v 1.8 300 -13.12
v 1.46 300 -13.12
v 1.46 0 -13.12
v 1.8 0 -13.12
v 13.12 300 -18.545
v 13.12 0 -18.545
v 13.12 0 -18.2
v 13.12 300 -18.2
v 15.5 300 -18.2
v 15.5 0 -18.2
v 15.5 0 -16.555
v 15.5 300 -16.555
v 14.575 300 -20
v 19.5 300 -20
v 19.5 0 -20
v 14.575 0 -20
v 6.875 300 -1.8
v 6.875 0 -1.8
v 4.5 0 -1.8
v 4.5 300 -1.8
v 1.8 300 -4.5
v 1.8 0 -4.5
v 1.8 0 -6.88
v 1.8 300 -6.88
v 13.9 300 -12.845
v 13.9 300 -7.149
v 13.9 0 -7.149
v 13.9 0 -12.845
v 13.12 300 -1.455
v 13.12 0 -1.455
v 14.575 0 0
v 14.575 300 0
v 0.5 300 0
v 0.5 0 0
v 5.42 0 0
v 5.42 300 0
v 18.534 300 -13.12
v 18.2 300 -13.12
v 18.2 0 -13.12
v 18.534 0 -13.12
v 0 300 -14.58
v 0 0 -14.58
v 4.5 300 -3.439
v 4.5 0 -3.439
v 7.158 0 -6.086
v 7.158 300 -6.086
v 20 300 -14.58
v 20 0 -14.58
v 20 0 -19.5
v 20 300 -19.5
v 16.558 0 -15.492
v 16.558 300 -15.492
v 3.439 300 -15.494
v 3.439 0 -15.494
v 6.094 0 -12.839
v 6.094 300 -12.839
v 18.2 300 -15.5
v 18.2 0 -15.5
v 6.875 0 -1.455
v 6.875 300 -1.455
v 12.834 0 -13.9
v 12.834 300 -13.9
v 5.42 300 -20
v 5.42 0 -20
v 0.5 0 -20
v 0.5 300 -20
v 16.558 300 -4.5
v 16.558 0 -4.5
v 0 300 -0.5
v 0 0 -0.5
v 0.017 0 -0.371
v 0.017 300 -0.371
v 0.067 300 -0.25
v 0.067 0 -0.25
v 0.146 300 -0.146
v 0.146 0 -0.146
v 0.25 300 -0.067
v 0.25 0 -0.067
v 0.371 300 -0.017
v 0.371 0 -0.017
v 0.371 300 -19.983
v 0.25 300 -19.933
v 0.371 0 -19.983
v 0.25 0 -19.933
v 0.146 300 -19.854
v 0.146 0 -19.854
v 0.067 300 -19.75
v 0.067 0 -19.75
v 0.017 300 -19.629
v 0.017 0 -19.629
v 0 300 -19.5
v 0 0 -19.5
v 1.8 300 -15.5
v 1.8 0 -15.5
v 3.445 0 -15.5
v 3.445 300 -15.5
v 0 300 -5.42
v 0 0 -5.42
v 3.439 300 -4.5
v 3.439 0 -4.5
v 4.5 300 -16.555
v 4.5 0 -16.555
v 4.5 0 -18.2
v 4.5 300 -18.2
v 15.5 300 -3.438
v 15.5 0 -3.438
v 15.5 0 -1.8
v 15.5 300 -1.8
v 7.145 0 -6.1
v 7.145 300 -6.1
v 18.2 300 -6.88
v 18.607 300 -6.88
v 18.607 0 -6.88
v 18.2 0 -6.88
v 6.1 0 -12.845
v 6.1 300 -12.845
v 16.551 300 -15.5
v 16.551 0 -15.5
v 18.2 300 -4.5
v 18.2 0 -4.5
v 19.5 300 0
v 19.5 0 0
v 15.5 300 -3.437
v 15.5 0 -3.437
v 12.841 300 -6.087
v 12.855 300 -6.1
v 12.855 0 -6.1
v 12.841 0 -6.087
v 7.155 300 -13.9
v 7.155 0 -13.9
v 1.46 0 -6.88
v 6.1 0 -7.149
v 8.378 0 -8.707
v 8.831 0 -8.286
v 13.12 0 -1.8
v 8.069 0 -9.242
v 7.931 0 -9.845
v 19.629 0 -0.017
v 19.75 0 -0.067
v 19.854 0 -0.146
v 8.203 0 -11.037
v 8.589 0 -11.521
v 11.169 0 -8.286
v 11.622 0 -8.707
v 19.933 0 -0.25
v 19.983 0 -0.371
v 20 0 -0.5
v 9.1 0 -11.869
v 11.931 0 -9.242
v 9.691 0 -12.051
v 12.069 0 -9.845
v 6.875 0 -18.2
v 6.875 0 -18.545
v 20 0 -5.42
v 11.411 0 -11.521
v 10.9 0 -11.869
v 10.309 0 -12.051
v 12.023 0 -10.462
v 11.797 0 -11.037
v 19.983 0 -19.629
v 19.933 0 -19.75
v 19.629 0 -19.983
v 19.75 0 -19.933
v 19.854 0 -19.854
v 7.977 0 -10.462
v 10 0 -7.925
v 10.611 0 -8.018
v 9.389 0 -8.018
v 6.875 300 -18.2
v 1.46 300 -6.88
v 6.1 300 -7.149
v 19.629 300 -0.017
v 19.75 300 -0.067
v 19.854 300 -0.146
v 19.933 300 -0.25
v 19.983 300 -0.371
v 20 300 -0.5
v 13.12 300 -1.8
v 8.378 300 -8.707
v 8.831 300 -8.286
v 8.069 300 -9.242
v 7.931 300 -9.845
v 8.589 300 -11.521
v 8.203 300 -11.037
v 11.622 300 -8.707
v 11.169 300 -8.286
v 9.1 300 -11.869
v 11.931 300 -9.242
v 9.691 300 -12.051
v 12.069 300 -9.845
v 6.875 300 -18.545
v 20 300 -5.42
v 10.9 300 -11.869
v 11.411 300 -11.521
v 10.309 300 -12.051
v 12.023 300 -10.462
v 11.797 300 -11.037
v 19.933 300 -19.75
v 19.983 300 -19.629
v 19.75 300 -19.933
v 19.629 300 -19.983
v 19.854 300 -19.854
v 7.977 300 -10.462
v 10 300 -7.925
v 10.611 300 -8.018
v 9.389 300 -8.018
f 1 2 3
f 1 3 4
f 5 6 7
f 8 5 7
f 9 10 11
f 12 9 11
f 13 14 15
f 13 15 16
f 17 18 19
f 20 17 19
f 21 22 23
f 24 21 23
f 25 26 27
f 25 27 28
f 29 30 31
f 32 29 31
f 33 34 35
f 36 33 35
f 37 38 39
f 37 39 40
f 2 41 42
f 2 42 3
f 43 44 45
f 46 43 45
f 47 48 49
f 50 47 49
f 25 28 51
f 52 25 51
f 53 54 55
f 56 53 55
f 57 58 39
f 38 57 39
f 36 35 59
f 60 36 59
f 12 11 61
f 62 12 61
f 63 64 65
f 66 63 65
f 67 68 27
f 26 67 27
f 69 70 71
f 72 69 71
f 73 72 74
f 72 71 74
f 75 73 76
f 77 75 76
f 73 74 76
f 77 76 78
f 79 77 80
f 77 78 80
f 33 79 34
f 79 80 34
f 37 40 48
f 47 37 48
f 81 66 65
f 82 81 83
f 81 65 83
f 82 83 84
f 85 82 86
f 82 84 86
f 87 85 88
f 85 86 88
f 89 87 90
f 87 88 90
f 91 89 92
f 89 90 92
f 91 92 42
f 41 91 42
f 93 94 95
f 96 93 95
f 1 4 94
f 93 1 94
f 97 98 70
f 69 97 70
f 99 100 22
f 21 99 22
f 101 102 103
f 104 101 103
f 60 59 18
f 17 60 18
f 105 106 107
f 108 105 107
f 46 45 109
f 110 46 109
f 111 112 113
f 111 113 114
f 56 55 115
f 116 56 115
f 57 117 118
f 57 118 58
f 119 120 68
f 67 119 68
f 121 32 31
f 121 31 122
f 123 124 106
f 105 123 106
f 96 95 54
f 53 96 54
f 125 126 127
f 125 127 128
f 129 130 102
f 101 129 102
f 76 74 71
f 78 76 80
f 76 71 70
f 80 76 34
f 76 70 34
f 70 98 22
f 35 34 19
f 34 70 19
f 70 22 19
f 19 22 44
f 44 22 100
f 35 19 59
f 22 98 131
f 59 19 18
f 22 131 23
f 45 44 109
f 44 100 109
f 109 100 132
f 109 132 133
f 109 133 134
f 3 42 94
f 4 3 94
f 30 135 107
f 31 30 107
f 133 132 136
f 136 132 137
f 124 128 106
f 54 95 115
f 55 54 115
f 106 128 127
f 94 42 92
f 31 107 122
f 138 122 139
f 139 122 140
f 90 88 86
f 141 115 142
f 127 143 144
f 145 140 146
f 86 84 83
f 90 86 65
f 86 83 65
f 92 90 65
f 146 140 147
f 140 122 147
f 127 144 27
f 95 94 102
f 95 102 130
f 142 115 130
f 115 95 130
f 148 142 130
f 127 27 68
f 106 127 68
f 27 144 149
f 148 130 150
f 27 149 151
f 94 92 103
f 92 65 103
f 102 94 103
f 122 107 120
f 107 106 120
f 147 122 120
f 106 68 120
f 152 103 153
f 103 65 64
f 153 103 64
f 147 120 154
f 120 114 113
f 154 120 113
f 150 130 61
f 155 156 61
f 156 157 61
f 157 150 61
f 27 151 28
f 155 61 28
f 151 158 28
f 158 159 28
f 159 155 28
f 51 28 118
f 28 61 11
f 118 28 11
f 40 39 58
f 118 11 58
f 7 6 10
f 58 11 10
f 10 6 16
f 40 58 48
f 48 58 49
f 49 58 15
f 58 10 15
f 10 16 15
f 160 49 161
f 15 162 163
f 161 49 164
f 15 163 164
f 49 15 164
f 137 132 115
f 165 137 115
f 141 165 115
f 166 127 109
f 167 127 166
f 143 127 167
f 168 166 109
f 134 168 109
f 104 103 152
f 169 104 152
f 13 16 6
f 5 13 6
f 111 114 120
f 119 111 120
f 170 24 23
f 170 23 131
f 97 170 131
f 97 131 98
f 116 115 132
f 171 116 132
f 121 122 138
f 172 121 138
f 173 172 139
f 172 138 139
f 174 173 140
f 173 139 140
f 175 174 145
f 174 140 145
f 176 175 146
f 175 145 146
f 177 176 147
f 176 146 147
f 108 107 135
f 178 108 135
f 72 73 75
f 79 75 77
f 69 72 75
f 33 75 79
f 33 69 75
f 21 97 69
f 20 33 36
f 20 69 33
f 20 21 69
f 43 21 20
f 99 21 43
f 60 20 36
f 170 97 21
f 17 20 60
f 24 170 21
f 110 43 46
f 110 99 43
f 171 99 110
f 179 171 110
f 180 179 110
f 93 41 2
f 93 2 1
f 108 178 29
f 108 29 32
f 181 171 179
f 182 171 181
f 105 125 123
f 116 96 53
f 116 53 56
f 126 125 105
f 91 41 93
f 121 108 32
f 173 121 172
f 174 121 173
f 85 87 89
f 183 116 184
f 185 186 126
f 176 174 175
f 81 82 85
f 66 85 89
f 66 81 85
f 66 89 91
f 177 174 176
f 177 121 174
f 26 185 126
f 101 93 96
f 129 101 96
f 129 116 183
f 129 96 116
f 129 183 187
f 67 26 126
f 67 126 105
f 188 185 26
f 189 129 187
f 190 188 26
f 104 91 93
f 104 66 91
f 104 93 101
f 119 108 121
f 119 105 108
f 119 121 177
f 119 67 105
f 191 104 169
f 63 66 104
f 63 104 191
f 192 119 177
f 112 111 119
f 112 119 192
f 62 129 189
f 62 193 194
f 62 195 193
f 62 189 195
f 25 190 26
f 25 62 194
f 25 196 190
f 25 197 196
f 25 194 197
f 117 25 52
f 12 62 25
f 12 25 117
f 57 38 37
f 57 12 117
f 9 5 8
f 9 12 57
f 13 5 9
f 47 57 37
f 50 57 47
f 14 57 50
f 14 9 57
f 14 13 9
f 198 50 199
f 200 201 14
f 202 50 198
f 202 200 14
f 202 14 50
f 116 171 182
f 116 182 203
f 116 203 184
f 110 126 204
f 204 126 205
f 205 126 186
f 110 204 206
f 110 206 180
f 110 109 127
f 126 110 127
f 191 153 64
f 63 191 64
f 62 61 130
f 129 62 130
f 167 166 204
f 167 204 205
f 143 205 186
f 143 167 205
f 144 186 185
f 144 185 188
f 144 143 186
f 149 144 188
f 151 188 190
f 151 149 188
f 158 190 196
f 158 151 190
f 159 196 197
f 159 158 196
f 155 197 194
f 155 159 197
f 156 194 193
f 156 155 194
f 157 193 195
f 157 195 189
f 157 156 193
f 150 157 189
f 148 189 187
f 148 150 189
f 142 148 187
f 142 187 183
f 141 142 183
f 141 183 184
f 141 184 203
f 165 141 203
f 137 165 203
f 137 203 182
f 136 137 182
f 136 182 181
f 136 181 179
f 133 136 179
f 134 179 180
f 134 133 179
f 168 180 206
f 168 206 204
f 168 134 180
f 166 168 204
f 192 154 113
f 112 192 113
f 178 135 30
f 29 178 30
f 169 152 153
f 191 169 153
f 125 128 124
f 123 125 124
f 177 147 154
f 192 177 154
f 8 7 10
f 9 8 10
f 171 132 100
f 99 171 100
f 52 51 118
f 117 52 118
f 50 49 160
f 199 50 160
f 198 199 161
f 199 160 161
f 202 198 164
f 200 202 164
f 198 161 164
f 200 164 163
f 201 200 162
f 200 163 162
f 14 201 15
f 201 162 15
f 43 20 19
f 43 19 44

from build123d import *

# Parameters (mm, degrees)
SKETCH1_R           = 2.074585303
BOSS_EXTRUDE2_DEPTH = 300


with BuildPart() as part:
    # Sketch1 → Boss-Extrude2 (new body)
    with BuildSketch(Plane(origin=(0, 0, 0), x_dir=(1, 0, 0), z_dir=(0, 1, 0))):
        with BuildLine():
            Line((6.1, 12.845), (6.1, 7.149086807))
            Line((6.1, 7.149086807), (3.439339828, 4.5))
            Line((3.439339828, 4.5), (1.8, 4.5))
            Line((1.8, 4.5), (1.8, 6.88))
            Line((1.8, 6.88), (1.46, 6.88))
            Line((1.46, 6.88), (0, 5.42))
            Line((0, 5.42), (0, 0.5))
            ThreePointArc((0, 0.5), (0.146446609, 0.146446609), (0.5, 0))
            Line((0.5, 0), (5.42, 0))
            Line((5.42, 0), (6.875, 1.455))
            Line((6.875, 1.455), (6.875, 1.8))
            Line((6.875, 1.8), (4.5, 1.8))
            Line((4.5, 1.8), (4.5, 3.4393348))
            Line((4.5, 3.4393348), (7.158345795, 6.086117297))
            Line((7.158345795, 6.086117297), (7.144523479, 6.1))
            Line((7.144523479, 6.1), (12.854625295, 6.1))
            Line((12.854625295, 6.1), (12.841221344, 6.086548451))
            Line((12.841221344, 6.086548451), (15.499715, 3.437461644))
            Line((15.499715, 3.437461644), (15.5, 3.437747657))
            Line((15.5, 3.437747657), (15.5, 1.8))
            Line((15.5, 1.8), (13.12, 1.8))
            Line((13.12, 1.8), (13.12, 1.455))
            Line((13.12, 1.455), (14.575, 0))
            Line((14.575, 0), (19.5, 0))
            ThreePointArc((19.5, 0), (19.853553391, 0.146446609), (20, 0.5))
            Line((20, 0.5), (20, 5.42))
            Line((20, 5.42), (18.606904708, 6.88))
            Line((18.606904708, 6.88), (18.2, 6.88))
            Line((18.2, 6.88), (18.2, 4.5))
            Line((18.2, 4.5), (16.558493656, 4.5))
            Line((16.558493656, 4.5), (13.9, 7.149086807))
            Line((13.9, 7.149086807), (13.9, 12.844511469))
            Line((13.9, 12.844511469), (16.558493656, 15.492177728))
            Line((16.558493656, 15.492177728), (16.550703242, 15.5))
            Line((16.550703242, 15.5), (18.2, 15.5))
            Line((18.2, 15.5), (18.2, 13.12))
            Line((18.2, 13.12), (18.534428266, 13.12))
            Line((18.534428266, 13.12), (20, 14.58))
            Line((20, 14.58), (20, 19.5))
            ThreePointArc((20, 19.5), (19.853553391, 19.853553391), (19.5, 20))
            Line((19.5, 20), (14.575, 20))
            Line((14.575, 20), (13.12, 18.545))
            Line((13.12, 18.545), (13.12, 18.2))
            Line((13.12, 18.2), (15.5, 18.2))
            Line((15.5, 18.2), (15.5, 16.555))
            Line((15.5, 16.555), (12.834142613, 13.9))
            Line((12.834142613, 13.9), (7.155, 13.9))
            Line((7.155, 13.9), (4.5, 16.555))
            Line((4.5, 16.555), (4.5, 18.2))
            Line((4.5, 18.2), (6.875, 18.2))
            Line((6.875, 18.2), (6.875, 18.545))
            Line((6.875, 18.545), (5.42, 20))
            Line((5.42, 20), (0.5, 20))
            ThreePointArc((0.5, 20), (0.146446609, 19.853553391), (0, 19.5))
            Line((0, 19.5), (0, 14.58))
            Line((0, 14.58), (1.46, 13.12))
            Line((1.46, 13.12), (1.8, 13.12))
            Line((1.8, 13.12), (1.8, 15.5))
            Line((1.8, 15.5), (3.445, 15.5))
            Line((3.445, 15.5), (3.439339828, 15.494339828))
            Line((3.439339828, 15.494339828), (6.094339828, 12.839339828))
            Line((6.094339828, 12.839339828), (6.1, 12.845))
        make_face()
        with Locations(Location((10, 10, 0), (0, 0, 270))):
            Circle(SKETCH1_R, mode=Mode.SUBTRACT)
    extrude(amount=BOSS_EXTRUDE2_DEPTH)


solid = part.part
